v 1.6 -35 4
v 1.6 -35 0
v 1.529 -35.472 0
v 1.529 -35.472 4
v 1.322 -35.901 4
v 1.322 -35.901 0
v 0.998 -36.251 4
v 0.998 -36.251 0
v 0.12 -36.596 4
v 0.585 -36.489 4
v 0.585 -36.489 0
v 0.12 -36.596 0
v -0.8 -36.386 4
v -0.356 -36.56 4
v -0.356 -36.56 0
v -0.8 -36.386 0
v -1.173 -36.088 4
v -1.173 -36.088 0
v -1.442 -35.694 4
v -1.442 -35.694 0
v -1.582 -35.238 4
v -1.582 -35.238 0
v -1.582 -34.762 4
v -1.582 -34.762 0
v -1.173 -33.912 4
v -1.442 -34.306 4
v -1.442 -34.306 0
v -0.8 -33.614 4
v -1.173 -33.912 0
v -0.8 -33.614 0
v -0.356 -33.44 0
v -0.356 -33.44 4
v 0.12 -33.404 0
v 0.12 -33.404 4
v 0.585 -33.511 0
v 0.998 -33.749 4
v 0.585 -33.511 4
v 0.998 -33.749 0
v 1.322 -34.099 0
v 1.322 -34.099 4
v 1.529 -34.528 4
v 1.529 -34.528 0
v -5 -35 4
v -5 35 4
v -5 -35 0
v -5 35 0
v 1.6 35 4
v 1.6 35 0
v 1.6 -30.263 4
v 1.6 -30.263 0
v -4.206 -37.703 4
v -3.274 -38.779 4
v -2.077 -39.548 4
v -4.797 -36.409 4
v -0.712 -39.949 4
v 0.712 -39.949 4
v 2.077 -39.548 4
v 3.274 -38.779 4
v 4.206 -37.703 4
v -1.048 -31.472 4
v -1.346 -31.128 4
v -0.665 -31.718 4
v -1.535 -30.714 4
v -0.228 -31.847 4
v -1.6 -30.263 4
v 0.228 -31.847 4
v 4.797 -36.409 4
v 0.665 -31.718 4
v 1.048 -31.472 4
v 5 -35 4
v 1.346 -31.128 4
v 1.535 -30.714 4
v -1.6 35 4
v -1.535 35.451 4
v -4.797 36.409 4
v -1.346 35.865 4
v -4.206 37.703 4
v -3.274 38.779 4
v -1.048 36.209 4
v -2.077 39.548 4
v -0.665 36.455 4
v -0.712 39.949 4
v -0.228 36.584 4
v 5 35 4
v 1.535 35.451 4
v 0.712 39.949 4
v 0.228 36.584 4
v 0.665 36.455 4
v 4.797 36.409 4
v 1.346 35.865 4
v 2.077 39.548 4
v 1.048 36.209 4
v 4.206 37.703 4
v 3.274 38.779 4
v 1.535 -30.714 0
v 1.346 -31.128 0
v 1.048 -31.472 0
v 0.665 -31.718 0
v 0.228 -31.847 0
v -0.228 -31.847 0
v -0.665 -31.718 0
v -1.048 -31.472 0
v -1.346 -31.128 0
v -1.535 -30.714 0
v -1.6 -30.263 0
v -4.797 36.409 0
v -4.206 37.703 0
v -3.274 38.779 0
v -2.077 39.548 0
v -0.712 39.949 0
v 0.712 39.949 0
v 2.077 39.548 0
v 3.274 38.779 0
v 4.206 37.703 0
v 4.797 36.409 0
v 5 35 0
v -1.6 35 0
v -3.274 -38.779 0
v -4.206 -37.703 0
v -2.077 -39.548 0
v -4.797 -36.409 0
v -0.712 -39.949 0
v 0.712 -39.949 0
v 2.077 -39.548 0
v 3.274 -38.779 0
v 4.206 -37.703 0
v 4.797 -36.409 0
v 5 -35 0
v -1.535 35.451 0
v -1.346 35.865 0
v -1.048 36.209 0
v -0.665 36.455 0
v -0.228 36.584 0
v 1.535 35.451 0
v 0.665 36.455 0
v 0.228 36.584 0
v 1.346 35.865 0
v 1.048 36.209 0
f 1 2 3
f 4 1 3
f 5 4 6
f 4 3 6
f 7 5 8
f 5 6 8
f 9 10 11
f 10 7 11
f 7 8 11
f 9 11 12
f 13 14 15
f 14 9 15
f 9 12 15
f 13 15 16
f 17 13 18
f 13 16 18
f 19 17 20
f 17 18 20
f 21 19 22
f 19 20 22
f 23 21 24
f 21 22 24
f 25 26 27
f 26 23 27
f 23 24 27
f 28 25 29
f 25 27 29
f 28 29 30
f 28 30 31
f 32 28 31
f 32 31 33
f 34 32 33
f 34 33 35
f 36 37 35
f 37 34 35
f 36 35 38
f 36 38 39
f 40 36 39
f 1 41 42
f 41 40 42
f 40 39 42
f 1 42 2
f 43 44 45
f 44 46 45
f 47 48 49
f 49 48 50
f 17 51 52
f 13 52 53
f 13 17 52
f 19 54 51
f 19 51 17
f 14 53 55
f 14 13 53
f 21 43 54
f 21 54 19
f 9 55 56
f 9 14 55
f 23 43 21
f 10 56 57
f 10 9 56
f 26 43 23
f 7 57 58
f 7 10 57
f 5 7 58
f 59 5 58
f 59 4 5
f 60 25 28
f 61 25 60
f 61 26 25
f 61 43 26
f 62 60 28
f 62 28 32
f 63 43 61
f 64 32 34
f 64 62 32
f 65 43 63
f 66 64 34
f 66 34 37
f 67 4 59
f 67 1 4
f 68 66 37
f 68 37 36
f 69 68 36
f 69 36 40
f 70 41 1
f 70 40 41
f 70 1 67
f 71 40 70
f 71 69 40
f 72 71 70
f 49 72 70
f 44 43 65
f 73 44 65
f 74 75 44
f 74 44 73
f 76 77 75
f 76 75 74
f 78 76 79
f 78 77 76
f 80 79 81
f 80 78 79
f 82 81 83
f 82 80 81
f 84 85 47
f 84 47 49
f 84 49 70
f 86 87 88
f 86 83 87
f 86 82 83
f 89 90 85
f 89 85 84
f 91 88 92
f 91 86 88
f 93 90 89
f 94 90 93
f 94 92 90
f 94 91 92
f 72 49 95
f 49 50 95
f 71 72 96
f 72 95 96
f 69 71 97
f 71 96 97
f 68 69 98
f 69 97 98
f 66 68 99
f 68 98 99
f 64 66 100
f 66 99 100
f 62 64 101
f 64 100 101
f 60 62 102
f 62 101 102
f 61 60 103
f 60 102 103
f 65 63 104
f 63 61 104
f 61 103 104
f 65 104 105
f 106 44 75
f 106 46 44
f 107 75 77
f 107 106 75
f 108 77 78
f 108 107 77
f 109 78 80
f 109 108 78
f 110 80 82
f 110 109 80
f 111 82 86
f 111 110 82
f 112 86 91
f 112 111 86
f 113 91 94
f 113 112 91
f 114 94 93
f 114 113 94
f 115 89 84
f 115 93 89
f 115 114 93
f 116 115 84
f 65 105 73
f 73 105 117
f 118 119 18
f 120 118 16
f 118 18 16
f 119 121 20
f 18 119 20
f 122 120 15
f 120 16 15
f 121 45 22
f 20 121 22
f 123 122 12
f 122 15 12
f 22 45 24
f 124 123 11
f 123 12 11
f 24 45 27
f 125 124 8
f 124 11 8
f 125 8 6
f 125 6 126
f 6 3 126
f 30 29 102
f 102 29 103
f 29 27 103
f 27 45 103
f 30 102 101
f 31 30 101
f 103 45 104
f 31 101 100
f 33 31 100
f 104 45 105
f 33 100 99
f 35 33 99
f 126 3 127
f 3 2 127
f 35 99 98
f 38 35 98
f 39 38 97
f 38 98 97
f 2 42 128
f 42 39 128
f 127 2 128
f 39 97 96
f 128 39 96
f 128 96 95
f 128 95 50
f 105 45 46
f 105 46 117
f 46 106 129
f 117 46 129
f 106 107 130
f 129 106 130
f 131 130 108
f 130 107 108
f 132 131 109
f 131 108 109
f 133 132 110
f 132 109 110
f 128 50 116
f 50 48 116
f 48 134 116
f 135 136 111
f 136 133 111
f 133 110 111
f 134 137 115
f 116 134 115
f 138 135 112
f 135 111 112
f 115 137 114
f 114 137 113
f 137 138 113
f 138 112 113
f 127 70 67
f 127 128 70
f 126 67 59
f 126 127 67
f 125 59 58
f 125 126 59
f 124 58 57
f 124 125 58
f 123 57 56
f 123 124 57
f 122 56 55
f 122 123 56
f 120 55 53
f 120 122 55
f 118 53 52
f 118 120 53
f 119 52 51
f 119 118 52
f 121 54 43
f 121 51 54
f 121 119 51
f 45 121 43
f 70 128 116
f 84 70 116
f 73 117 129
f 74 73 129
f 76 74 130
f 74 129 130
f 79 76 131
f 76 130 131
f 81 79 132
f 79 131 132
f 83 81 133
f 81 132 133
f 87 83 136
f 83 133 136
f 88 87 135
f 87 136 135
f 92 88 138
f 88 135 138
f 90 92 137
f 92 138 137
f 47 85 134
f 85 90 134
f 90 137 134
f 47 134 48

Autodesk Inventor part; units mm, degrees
ref_plane "YZ Plane" through (0, 0, 0) normal (1, 0, 0) x (0, 1, 0)
ref_plane "XZ Plane" through (0, 0, 0) normal (0, 1, 0) x (-1, 0, 0)
ref_plane "XY Plane" through (0, 0, 0) normal (0, 0, 1) x (1, 0, 0)
sketch "Эскиз1" plane through (0, 0, 0) normal (0, 0, 1) x (1, 0, 0)
  arc A0 (5, 35) -> (-5, 35) centre (0, 35) ccw projected
  line L0 (-5, 35) -> (-5, -35) projected
  arc A1 (-5, -35) -> (5, -35) centre (0, -35) ccw projected
  line L1 (5, -35) -> (5, 35) projected
  arc A2 (-1.6, -30.2629) -> (1.6, -30.2629) centre (0, -30.2629) ccw projected
  line L2 (-1.6, -30.2629) -> (-1.6, 35) projected
  arc A3 (1.6, 35) -> (-1.6, 35) centre (0, 35) ccw projected
  line L3 (1.6, 35) -> (1.6, -30.2629) projected
  circle A4 centre (0, -35) radius 1.6 projected
  point P0 (0, 0)
extrude "Выдавливание1" add sketch "Эскиз1" along normal blind 4
properties part number "holder"
